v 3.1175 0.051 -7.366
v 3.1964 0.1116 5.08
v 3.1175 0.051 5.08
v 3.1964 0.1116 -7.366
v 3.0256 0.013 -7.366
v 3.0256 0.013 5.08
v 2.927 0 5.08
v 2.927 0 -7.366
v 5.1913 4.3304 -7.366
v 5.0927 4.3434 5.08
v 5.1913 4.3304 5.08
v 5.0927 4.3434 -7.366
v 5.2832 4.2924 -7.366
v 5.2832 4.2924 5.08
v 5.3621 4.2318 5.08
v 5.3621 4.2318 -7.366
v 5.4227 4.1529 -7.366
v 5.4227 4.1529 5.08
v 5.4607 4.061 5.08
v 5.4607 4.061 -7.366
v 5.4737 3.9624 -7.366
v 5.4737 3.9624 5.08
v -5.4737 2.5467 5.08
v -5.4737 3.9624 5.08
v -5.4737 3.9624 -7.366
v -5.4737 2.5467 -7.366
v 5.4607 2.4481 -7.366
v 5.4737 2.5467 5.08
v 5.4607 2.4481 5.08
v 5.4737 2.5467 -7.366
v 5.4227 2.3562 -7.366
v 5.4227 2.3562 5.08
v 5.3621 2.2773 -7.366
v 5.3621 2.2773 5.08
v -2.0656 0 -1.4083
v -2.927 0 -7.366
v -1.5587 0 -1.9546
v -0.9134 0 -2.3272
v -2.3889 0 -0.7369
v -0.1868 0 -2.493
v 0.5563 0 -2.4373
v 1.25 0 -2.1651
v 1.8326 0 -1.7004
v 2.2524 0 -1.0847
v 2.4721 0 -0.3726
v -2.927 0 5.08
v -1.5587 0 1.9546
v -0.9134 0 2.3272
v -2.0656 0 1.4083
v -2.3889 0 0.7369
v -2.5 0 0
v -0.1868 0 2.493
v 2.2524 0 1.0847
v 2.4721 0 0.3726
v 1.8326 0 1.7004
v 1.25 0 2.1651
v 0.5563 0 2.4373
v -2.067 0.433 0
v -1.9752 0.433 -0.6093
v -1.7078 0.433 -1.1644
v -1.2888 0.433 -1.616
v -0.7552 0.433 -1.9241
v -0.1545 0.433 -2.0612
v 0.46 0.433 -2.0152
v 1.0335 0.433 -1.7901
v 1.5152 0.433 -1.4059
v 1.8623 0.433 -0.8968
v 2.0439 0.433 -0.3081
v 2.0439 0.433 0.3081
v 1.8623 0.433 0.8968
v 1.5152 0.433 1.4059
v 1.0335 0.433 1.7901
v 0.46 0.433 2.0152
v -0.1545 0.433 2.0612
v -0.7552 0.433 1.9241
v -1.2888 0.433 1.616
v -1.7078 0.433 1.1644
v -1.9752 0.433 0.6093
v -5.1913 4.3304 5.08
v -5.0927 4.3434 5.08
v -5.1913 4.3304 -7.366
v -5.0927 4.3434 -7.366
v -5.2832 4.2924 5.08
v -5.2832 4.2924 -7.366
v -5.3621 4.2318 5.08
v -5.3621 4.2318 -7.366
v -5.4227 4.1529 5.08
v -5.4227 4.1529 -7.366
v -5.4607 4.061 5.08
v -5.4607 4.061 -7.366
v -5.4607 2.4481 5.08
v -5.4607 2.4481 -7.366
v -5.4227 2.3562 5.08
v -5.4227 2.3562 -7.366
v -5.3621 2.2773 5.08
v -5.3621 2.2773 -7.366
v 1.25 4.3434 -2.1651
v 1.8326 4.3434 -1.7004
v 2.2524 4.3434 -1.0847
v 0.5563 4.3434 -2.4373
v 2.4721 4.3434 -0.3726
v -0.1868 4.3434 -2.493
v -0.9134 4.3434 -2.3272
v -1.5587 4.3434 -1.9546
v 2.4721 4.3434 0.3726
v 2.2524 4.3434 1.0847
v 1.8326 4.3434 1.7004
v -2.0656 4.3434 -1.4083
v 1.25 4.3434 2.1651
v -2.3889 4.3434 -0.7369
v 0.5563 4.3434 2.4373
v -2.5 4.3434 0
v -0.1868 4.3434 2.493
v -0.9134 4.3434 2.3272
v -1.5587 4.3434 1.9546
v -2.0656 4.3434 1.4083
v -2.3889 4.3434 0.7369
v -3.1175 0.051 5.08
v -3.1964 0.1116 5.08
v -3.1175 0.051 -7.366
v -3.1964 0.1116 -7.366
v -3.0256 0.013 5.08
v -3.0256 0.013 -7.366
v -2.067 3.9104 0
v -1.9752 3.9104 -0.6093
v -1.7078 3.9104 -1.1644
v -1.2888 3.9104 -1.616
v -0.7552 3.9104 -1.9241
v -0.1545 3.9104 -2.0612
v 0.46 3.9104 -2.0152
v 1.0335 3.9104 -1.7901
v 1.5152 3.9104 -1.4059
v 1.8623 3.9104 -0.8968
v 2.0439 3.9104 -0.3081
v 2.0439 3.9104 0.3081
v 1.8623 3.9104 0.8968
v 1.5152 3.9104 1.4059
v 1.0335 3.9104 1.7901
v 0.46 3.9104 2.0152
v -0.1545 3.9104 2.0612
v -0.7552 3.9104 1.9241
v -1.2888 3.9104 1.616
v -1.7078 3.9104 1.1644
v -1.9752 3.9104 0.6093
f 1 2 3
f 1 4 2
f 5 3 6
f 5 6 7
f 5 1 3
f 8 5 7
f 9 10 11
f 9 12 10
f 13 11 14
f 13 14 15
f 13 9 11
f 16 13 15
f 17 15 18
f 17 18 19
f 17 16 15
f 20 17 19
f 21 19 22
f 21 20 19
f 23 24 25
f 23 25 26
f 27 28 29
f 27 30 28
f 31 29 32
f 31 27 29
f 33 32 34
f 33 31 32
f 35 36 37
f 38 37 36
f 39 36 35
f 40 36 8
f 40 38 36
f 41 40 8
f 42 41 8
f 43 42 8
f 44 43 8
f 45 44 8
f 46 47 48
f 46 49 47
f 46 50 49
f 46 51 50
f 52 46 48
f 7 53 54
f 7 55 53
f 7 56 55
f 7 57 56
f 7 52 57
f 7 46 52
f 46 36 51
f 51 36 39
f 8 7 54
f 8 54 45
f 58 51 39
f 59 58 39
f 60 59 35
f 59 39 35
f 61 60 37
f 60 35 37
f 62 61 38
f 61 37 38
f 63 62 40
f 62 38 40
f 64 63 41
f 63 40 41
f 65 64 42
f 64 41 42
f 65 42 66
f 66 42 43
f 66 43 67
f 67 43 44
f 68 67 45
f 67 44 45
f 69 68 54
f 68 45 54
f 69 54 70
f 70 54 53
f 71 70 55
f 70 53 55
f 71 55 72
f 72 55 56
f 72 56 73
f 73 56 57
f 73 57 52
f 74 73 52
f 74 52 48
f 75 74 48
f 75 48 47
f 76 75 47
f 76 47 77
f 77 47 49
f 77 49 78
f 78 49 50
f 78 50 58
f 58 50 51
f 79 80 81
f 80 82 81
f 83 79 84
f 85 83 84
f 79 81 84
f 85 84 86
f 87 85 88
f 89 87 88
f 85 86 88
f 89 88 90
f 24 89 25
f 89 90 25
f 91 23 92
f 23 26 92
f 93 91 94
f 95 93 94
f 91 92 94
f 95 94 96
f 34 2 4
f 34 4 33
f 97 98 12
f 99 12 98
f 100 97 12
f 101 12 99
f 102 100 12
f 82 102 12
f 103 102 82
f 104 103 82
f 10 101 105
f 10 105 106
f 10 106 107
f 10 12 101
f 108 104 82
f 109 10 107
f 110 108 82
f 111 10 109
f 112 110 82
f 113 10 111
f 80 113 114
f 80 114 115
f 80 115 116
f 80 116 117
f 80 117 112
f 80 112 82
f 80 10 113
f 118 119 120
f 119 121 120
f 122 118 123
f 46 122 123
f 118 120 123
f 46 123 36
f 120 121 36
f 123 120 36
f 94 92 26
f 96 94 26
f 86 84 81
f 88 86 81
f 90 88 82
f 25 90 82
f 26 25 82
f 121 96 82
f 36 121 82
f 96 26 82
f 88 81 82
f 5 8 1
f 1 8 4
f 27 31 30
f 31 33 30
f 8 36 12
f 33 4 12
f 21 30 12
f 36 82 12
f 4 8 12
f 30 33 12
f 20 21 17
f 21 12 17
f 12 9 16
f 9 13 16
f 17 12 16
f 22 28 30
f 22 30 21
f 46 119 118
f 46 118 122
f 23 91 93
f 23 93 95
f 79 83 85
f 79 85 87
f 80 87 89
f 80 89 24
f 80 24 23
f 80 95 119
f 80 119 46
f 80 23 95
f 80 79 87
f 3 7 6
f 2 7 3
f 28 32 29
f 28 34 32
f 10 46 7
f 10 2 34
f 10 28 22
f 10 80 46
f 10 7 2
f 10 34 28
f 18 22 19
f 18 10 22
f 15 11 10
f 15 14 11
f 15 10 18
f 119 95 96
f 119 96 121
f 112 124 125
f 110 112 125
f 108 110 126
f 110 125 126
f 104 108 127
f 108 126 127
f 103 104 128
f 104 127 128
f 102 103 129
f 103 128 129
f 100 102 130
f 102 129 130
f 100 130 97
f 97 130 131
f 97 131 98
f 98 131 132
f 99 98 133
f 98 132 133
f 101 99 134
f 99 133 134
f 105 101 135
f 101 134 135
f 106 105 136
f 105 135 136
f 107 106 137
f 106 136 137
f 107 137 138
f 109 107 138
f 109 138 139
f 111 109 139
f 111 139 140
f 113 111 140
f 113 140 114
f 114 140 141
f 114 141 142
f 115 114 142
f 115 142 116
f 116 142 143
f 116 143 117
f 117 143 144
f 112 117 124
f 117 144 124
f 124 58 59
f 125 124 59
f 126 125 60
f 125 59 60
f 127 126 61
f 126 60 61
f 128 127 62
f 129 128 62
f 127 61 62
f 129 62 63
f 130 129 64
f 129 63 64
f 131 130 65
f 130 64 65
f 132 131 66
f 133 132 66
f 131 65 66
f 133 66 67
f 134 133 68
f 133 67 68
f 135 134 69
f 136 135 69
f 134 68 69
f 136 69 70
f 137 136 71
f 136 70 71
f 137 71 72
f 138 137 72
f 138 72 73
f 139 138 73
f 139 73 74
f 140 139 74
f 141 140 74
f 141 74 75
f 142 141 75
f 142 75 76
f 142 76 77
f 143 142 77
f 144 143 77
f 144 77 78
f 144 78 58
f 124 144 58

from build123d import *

# Parameters (mm, degrees)
BOSS_EXTRUDE1_DEPTH   = 12.446
F_6_CLEARANCE_HOLE1_D = 4.134
CHAMFER1_SIZE         = 0.433
FILLET1_R             = 0.381


with BuildPart() as part:
    # Sketch1 → Boss-Extrude1 (new body)
    with BuildSketch(Plane.XY.offset(5.08)):
        Polygon((5.4737, 4.3434), (-5.4737, 4.3434), (-5.4737, 2.38887), (-3.08483, 0), (3.08483, 0), (5.4737, 2.38887), align=None)
    extrude(amount=-BOSS_EXTRUDE1_DEPTH)

    # #6 Clearance Hole1 (through all)
    with Locations(Plane(origin=(0, 4.3434, 0), x_dir=(1, 0, 0), z_dir=(0, 1, 0))):
        with Locations((0, 0)):
            Hole(F_6_CLEARANCE_HOLE1_D / 2)

    # Chamfer1
    chamfer1_edges = [part.edges().sort_by_distance(p)[0] for p in [
        (2.067, 4.3434, 0),
        (2.067, 0, 0),
    ]]
    chamfer(chamfer1_edges, length=CHAMFER1_SIZE)

    # Fillet1
    fillet1_edges = [part.edges().sort_by_distance(p)[0] for p in [
        (5.4737, 2.38887, -1.143),
        (3.08483, 0, -1.143),
        (-3.08483, 0, -1.143),
        (-5.4737, 2.38887, -1.143),
        (-5.4737, 4.3434, -1.143),
        (5.4737, 4.3434, -1.143),
    ]]
    fillet(fillet1_edges, radius=FILLET1_R)


solid = part.part
